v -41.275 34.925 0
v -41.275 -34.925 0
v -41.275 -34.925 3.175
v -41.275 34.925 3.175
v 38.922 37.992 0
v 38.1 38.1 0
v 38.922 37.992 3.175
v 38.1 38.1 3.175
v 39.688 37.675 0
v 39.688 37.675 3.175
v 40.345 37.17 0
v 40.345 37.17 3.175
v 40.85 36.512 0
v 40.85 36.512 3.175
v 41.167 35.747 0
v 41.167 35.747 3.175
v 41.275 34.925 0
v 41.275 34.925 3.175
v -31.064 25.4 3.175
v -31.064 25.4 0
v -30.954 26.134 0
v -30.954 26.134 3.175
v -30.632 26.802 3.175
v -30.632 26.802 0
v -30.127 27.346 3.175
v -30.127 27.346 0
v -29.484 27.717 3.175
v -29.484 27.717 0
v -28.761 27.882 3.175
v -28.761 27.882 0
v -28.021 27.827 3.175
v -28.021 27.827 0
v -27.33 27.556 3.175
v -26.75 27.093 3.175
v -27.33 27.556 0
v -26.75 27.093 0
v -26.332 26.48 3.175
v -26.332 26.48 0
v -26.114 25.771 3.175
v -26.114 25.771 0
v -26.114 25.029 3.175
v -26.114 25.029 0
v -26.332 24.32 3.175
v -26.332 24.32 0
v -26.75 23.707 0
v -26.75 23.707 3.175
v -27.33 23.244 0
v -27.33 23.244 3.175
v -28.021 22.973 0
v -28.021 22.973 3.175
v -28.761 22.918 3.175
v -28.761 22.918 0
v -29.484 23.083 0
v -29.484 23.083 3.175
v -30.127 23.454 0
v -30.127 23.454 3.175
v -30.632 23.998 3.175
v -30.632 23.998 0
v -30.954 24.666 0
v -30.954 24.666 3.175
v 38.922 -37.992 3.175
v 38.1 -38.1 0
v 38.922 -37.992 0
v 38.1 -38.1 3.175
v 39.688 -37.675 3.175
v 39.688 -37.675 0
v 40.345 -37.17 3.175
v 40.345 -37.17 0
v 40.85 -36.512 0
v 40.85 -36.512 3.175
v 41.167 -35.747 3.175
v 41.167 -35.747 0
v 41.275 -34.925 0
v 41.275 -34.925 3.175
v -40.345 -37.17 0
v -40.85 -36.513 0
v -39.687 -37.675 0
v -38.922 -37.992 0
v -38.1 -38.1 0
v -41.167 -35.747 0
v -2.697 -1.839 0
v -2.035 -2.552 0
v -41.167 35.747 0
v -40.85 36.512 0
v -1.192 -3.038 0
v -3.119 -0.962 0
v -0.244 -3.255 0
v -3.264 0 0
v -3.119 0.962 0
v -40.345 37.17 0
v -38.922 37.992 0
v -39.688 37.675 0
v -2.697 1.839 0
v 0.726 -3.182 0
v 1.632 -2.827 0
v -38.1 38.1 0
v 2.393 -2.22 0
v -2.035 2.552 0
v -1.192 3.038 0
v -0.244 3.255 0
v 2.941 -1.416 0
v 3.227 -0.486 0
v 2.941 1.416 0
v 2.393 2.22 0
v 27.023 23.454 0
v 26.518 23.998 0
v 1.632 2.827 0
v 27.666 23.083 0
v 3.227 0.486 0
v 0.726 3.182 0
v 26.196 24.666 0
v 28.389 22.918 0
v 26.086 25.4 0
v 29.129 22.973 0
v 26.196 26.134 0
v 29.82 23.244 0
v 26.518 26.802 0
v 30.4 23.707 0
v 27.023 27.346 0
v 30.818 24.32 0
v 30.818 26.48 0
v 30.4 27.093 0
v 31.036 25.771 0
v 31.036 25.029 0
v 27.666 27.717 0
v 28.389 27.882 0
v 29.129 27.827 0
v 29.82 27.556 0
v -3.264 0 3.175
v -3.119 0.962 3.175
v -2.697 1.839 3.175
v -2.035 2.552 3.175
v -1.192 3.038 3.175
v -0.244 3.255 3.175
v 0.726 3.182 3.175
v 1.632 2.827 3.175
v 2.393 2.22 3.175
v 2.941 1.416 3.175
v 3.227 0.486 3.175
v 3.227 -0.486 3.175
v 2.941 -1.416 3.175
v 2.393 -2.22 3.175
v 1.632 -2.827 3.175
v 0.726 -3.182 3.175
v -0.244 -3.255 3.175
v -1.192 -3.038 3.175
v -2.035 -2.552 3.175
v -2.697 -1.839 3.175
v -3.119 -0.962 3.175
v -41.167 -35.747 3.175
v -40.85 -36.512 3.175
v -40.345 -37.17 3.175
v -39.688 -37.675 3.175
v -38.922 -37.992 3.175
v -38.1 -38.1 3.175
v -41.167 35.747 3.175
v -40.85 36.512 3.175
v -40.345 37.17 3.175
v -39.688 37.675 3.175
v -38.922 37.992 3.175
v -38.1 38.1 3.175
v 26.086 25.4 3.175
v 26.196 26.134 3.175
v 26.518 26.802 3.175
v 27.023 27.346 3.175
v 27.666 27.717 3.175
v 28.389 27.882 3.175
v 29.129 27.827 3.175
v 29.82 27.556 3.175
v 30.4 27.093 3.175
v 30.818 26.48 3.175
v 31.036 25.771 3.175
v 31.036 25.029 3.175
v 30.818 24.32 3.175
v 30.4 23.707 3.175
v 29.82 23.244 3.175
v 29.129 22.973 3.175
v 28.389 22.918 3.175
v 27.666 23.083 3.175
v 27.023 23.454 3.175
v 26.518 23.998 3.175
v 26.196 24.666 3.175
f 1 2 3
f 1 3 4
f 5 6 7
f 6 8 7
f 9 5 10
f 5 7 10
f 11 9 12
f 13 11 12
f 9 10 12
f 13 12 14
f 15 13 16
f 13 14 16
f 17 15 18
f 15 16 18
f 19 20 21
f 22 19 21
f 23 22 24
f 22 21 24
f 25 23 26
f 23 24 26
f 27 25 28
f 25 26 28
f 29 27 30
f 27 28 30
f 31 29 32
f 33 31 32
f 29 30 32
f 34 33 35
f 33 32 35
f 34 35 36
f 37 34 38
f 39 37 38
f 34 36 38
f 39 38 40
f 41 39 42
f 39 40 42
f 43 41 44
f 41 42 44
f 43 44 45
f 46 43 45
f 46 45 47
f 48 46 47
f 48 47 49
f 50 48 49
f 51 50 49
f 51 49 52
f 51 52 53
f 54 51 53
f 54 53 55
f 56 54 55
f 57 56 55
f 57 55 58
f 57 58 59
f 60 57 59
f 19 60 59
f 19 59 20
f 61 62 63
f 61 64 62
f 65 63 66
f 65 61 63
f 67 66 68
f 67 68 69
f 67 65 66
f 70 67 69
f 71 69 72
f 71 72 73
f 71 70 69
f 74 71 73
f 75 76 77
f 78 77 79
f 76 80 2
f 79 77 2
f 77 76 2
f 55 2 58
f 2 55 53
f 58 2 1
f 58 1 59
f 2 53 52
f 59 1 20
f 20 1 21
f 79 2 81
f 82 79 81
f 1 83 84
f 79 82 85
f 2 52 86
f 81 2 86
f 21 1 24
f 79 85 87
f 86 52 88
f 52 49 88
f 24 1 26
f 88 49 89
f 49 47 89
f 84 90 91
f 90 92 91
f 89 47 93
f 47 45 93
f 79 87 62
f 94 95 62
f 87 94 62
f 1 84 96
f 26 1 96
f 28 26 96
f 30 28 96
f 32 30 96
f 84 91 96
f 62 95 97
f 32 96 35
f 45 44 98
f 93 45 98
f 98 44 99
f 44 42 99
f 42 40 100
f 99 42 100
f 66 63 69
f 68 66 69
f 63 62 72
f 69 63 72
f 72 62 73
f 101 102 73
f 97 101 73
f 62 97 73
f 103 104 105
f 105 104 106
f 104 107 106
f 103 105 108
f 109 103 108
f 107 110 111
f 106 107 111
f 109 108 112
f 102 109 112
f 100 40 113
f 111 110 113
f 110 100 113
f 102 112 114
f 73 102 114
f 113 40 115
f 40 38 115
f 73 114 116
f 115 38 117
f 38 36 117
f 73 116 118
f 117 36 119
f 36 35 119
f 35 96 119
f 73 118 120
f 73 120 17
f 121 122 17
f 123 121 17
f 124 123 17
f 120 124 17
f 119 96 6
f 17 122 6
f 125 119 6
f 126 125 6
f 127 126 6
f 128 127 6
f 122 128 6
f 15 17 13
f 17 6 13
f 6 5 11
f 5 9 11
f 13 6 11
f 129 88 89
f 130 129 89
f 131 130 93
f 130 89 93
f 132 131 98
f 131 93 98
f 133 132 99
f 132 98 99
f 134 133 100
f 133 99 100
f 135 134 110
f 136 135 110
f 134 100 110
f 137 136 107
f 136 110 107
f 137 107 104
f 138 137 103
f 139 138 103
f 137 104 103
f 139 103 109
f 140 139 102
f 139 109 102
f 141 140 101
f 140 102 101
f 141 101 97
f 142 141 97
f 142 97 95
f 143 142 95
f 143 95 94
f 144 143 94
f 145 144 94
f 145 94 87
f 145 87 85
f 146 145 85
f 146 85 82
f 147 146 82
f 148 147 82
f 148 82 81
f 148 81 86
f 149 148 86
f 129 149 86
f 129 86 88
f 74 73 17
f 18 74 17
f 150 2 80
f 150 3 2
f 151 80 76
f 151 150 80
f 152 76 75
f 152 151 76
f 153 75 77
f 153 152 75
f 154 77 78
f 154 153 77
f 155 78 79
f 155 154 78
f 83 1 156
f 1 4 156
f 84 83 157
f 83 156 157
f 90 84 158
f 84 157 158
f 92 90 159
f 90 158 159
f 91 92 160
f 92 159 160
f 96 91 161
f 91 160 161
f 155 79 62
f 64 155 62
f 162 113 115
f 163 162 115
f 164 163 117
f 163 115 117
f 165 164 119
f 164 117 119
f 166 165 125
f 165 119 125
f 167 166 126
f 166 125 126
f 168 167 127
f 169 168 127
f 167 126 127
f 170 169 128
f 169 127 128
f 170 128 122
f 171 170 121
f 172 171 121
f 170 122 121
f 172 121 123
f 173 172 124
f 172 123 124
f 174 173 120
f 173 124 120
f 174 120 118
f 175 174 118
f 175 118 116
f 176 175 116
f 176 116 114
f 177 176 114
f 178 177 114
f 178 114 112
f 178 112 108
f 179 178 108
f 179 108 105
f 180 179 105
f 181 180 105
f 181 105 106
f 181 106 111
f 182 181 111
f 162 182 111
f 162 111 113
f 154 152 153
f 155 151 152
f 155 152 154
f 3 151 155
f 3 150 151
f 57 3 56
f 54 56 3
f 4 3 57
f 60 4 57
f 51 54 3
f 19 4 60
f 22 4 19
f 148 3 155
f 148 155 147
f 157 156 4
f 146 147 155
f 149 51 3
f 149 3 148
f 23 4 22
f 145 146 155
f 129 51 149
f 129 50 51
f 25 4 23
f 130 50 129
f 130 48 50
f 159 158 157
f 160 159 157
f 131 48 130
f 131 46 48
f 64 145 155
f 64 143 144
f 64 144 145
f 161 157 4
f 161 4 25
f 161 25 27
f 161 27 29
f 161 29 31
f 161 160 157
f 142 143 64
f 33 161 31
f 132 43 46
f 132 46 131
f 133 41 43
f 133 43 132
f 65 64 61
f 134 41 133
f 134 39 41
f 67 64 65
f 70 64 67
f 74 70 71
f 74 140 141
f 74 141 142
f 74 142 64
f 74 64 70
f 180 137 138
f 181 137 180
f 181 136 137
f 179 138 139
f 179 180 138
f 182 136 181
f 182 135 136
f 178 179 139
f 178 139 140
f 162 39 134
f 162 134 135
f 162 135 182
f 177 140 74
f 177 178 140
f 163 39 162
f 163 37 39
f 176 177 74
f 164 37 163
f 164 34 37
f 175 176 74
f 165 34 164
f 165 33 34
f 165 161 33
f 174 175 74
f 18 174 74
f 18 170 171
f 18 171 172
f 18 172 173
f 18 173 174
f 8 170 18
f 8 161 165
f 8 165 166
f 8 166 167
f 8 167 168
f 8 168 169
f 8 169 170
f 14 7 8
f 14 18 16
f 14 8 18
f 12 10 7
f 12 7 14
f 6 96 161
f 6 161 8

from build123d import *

# Parameters (mm, degrees)
SKETCH1_W               = 82.55
SKETCH1_H               = 76.2
SKETCH1_R               = 3.175
BOSS_EXTRUDE1_DEPTH     = 3.175
F_10_CLEARANCE_HOLE1_D  = 4.9784
F_1_4_CLEARANCE_HOLE1_D = 6.5278
FILLET2_R               = 3.175


with BuildPart() as part:
    # Sketch1 → Boss-Extrude1 (new body)
    # profile 1 of 4: a face of its own
    with BuildSketch(Plane.XY):
        Rectangle(SKETCH1_W, SKETCH1_H)
        Circle(SKETCH1_R, mode=Mode.SUBTRACT)
        with Locations((28.575, 25.4)):
            Circle(SKETCH1_R, mode=Mode.SUBTRACT)
        with Locations((-28.575, 25.4)):
            Circle(SKETCH1_R, mode=Mode.SUBTRACT)
    # profile 2 of 4: a face of its own
    with BuildSketch(Plane.XY):
        with Locations((-28.575, 25.4)):
            Circle(SKETCH1_R)
    # profile 3 of 4: a face of its own
    with BuildSketch(Plane.XY):
        Circle(SKETCH1_R)
    # profile 4 of 4: a face of its own
    with BuildSketch(Plane.XY):
        with Locations((28.575, 25.4)):
            Circle(SKETCH1_R)
    extrude(amount=BOSS_EXTRUDE1_DEPTH)

    # #10 Clearance Hole1 (through all)
    with Locations(Plane.XY.offset(3.175)):
        with Locations((-28.575, 25.4), (28.575, 25.4)):
            Hole(F_10_CLEARANCE_HOLE1_D / 2)

    # 1/4 Clearance Hole1 (through all)
    with Locations(Plane.XY.offset(3.175)):
        with Locations((0, 0)):
            Hole(F_1_4_CLEARANCE_HOLE1_D / 2)

    # Fillet2
    fillet2_edges = [part.edges().sort_by_distance(p)[0] for p in [
        (-41.275, -38.1, 1.5875),
        (-41.275, 38.1, 1.5875),
        (41.275, 38.1, 1.5875),
        (41.275, -38.1, 1.5875),
    ]]
    fillet(fillet2_edges, radius=FILLET2_R)


solid = part.part
